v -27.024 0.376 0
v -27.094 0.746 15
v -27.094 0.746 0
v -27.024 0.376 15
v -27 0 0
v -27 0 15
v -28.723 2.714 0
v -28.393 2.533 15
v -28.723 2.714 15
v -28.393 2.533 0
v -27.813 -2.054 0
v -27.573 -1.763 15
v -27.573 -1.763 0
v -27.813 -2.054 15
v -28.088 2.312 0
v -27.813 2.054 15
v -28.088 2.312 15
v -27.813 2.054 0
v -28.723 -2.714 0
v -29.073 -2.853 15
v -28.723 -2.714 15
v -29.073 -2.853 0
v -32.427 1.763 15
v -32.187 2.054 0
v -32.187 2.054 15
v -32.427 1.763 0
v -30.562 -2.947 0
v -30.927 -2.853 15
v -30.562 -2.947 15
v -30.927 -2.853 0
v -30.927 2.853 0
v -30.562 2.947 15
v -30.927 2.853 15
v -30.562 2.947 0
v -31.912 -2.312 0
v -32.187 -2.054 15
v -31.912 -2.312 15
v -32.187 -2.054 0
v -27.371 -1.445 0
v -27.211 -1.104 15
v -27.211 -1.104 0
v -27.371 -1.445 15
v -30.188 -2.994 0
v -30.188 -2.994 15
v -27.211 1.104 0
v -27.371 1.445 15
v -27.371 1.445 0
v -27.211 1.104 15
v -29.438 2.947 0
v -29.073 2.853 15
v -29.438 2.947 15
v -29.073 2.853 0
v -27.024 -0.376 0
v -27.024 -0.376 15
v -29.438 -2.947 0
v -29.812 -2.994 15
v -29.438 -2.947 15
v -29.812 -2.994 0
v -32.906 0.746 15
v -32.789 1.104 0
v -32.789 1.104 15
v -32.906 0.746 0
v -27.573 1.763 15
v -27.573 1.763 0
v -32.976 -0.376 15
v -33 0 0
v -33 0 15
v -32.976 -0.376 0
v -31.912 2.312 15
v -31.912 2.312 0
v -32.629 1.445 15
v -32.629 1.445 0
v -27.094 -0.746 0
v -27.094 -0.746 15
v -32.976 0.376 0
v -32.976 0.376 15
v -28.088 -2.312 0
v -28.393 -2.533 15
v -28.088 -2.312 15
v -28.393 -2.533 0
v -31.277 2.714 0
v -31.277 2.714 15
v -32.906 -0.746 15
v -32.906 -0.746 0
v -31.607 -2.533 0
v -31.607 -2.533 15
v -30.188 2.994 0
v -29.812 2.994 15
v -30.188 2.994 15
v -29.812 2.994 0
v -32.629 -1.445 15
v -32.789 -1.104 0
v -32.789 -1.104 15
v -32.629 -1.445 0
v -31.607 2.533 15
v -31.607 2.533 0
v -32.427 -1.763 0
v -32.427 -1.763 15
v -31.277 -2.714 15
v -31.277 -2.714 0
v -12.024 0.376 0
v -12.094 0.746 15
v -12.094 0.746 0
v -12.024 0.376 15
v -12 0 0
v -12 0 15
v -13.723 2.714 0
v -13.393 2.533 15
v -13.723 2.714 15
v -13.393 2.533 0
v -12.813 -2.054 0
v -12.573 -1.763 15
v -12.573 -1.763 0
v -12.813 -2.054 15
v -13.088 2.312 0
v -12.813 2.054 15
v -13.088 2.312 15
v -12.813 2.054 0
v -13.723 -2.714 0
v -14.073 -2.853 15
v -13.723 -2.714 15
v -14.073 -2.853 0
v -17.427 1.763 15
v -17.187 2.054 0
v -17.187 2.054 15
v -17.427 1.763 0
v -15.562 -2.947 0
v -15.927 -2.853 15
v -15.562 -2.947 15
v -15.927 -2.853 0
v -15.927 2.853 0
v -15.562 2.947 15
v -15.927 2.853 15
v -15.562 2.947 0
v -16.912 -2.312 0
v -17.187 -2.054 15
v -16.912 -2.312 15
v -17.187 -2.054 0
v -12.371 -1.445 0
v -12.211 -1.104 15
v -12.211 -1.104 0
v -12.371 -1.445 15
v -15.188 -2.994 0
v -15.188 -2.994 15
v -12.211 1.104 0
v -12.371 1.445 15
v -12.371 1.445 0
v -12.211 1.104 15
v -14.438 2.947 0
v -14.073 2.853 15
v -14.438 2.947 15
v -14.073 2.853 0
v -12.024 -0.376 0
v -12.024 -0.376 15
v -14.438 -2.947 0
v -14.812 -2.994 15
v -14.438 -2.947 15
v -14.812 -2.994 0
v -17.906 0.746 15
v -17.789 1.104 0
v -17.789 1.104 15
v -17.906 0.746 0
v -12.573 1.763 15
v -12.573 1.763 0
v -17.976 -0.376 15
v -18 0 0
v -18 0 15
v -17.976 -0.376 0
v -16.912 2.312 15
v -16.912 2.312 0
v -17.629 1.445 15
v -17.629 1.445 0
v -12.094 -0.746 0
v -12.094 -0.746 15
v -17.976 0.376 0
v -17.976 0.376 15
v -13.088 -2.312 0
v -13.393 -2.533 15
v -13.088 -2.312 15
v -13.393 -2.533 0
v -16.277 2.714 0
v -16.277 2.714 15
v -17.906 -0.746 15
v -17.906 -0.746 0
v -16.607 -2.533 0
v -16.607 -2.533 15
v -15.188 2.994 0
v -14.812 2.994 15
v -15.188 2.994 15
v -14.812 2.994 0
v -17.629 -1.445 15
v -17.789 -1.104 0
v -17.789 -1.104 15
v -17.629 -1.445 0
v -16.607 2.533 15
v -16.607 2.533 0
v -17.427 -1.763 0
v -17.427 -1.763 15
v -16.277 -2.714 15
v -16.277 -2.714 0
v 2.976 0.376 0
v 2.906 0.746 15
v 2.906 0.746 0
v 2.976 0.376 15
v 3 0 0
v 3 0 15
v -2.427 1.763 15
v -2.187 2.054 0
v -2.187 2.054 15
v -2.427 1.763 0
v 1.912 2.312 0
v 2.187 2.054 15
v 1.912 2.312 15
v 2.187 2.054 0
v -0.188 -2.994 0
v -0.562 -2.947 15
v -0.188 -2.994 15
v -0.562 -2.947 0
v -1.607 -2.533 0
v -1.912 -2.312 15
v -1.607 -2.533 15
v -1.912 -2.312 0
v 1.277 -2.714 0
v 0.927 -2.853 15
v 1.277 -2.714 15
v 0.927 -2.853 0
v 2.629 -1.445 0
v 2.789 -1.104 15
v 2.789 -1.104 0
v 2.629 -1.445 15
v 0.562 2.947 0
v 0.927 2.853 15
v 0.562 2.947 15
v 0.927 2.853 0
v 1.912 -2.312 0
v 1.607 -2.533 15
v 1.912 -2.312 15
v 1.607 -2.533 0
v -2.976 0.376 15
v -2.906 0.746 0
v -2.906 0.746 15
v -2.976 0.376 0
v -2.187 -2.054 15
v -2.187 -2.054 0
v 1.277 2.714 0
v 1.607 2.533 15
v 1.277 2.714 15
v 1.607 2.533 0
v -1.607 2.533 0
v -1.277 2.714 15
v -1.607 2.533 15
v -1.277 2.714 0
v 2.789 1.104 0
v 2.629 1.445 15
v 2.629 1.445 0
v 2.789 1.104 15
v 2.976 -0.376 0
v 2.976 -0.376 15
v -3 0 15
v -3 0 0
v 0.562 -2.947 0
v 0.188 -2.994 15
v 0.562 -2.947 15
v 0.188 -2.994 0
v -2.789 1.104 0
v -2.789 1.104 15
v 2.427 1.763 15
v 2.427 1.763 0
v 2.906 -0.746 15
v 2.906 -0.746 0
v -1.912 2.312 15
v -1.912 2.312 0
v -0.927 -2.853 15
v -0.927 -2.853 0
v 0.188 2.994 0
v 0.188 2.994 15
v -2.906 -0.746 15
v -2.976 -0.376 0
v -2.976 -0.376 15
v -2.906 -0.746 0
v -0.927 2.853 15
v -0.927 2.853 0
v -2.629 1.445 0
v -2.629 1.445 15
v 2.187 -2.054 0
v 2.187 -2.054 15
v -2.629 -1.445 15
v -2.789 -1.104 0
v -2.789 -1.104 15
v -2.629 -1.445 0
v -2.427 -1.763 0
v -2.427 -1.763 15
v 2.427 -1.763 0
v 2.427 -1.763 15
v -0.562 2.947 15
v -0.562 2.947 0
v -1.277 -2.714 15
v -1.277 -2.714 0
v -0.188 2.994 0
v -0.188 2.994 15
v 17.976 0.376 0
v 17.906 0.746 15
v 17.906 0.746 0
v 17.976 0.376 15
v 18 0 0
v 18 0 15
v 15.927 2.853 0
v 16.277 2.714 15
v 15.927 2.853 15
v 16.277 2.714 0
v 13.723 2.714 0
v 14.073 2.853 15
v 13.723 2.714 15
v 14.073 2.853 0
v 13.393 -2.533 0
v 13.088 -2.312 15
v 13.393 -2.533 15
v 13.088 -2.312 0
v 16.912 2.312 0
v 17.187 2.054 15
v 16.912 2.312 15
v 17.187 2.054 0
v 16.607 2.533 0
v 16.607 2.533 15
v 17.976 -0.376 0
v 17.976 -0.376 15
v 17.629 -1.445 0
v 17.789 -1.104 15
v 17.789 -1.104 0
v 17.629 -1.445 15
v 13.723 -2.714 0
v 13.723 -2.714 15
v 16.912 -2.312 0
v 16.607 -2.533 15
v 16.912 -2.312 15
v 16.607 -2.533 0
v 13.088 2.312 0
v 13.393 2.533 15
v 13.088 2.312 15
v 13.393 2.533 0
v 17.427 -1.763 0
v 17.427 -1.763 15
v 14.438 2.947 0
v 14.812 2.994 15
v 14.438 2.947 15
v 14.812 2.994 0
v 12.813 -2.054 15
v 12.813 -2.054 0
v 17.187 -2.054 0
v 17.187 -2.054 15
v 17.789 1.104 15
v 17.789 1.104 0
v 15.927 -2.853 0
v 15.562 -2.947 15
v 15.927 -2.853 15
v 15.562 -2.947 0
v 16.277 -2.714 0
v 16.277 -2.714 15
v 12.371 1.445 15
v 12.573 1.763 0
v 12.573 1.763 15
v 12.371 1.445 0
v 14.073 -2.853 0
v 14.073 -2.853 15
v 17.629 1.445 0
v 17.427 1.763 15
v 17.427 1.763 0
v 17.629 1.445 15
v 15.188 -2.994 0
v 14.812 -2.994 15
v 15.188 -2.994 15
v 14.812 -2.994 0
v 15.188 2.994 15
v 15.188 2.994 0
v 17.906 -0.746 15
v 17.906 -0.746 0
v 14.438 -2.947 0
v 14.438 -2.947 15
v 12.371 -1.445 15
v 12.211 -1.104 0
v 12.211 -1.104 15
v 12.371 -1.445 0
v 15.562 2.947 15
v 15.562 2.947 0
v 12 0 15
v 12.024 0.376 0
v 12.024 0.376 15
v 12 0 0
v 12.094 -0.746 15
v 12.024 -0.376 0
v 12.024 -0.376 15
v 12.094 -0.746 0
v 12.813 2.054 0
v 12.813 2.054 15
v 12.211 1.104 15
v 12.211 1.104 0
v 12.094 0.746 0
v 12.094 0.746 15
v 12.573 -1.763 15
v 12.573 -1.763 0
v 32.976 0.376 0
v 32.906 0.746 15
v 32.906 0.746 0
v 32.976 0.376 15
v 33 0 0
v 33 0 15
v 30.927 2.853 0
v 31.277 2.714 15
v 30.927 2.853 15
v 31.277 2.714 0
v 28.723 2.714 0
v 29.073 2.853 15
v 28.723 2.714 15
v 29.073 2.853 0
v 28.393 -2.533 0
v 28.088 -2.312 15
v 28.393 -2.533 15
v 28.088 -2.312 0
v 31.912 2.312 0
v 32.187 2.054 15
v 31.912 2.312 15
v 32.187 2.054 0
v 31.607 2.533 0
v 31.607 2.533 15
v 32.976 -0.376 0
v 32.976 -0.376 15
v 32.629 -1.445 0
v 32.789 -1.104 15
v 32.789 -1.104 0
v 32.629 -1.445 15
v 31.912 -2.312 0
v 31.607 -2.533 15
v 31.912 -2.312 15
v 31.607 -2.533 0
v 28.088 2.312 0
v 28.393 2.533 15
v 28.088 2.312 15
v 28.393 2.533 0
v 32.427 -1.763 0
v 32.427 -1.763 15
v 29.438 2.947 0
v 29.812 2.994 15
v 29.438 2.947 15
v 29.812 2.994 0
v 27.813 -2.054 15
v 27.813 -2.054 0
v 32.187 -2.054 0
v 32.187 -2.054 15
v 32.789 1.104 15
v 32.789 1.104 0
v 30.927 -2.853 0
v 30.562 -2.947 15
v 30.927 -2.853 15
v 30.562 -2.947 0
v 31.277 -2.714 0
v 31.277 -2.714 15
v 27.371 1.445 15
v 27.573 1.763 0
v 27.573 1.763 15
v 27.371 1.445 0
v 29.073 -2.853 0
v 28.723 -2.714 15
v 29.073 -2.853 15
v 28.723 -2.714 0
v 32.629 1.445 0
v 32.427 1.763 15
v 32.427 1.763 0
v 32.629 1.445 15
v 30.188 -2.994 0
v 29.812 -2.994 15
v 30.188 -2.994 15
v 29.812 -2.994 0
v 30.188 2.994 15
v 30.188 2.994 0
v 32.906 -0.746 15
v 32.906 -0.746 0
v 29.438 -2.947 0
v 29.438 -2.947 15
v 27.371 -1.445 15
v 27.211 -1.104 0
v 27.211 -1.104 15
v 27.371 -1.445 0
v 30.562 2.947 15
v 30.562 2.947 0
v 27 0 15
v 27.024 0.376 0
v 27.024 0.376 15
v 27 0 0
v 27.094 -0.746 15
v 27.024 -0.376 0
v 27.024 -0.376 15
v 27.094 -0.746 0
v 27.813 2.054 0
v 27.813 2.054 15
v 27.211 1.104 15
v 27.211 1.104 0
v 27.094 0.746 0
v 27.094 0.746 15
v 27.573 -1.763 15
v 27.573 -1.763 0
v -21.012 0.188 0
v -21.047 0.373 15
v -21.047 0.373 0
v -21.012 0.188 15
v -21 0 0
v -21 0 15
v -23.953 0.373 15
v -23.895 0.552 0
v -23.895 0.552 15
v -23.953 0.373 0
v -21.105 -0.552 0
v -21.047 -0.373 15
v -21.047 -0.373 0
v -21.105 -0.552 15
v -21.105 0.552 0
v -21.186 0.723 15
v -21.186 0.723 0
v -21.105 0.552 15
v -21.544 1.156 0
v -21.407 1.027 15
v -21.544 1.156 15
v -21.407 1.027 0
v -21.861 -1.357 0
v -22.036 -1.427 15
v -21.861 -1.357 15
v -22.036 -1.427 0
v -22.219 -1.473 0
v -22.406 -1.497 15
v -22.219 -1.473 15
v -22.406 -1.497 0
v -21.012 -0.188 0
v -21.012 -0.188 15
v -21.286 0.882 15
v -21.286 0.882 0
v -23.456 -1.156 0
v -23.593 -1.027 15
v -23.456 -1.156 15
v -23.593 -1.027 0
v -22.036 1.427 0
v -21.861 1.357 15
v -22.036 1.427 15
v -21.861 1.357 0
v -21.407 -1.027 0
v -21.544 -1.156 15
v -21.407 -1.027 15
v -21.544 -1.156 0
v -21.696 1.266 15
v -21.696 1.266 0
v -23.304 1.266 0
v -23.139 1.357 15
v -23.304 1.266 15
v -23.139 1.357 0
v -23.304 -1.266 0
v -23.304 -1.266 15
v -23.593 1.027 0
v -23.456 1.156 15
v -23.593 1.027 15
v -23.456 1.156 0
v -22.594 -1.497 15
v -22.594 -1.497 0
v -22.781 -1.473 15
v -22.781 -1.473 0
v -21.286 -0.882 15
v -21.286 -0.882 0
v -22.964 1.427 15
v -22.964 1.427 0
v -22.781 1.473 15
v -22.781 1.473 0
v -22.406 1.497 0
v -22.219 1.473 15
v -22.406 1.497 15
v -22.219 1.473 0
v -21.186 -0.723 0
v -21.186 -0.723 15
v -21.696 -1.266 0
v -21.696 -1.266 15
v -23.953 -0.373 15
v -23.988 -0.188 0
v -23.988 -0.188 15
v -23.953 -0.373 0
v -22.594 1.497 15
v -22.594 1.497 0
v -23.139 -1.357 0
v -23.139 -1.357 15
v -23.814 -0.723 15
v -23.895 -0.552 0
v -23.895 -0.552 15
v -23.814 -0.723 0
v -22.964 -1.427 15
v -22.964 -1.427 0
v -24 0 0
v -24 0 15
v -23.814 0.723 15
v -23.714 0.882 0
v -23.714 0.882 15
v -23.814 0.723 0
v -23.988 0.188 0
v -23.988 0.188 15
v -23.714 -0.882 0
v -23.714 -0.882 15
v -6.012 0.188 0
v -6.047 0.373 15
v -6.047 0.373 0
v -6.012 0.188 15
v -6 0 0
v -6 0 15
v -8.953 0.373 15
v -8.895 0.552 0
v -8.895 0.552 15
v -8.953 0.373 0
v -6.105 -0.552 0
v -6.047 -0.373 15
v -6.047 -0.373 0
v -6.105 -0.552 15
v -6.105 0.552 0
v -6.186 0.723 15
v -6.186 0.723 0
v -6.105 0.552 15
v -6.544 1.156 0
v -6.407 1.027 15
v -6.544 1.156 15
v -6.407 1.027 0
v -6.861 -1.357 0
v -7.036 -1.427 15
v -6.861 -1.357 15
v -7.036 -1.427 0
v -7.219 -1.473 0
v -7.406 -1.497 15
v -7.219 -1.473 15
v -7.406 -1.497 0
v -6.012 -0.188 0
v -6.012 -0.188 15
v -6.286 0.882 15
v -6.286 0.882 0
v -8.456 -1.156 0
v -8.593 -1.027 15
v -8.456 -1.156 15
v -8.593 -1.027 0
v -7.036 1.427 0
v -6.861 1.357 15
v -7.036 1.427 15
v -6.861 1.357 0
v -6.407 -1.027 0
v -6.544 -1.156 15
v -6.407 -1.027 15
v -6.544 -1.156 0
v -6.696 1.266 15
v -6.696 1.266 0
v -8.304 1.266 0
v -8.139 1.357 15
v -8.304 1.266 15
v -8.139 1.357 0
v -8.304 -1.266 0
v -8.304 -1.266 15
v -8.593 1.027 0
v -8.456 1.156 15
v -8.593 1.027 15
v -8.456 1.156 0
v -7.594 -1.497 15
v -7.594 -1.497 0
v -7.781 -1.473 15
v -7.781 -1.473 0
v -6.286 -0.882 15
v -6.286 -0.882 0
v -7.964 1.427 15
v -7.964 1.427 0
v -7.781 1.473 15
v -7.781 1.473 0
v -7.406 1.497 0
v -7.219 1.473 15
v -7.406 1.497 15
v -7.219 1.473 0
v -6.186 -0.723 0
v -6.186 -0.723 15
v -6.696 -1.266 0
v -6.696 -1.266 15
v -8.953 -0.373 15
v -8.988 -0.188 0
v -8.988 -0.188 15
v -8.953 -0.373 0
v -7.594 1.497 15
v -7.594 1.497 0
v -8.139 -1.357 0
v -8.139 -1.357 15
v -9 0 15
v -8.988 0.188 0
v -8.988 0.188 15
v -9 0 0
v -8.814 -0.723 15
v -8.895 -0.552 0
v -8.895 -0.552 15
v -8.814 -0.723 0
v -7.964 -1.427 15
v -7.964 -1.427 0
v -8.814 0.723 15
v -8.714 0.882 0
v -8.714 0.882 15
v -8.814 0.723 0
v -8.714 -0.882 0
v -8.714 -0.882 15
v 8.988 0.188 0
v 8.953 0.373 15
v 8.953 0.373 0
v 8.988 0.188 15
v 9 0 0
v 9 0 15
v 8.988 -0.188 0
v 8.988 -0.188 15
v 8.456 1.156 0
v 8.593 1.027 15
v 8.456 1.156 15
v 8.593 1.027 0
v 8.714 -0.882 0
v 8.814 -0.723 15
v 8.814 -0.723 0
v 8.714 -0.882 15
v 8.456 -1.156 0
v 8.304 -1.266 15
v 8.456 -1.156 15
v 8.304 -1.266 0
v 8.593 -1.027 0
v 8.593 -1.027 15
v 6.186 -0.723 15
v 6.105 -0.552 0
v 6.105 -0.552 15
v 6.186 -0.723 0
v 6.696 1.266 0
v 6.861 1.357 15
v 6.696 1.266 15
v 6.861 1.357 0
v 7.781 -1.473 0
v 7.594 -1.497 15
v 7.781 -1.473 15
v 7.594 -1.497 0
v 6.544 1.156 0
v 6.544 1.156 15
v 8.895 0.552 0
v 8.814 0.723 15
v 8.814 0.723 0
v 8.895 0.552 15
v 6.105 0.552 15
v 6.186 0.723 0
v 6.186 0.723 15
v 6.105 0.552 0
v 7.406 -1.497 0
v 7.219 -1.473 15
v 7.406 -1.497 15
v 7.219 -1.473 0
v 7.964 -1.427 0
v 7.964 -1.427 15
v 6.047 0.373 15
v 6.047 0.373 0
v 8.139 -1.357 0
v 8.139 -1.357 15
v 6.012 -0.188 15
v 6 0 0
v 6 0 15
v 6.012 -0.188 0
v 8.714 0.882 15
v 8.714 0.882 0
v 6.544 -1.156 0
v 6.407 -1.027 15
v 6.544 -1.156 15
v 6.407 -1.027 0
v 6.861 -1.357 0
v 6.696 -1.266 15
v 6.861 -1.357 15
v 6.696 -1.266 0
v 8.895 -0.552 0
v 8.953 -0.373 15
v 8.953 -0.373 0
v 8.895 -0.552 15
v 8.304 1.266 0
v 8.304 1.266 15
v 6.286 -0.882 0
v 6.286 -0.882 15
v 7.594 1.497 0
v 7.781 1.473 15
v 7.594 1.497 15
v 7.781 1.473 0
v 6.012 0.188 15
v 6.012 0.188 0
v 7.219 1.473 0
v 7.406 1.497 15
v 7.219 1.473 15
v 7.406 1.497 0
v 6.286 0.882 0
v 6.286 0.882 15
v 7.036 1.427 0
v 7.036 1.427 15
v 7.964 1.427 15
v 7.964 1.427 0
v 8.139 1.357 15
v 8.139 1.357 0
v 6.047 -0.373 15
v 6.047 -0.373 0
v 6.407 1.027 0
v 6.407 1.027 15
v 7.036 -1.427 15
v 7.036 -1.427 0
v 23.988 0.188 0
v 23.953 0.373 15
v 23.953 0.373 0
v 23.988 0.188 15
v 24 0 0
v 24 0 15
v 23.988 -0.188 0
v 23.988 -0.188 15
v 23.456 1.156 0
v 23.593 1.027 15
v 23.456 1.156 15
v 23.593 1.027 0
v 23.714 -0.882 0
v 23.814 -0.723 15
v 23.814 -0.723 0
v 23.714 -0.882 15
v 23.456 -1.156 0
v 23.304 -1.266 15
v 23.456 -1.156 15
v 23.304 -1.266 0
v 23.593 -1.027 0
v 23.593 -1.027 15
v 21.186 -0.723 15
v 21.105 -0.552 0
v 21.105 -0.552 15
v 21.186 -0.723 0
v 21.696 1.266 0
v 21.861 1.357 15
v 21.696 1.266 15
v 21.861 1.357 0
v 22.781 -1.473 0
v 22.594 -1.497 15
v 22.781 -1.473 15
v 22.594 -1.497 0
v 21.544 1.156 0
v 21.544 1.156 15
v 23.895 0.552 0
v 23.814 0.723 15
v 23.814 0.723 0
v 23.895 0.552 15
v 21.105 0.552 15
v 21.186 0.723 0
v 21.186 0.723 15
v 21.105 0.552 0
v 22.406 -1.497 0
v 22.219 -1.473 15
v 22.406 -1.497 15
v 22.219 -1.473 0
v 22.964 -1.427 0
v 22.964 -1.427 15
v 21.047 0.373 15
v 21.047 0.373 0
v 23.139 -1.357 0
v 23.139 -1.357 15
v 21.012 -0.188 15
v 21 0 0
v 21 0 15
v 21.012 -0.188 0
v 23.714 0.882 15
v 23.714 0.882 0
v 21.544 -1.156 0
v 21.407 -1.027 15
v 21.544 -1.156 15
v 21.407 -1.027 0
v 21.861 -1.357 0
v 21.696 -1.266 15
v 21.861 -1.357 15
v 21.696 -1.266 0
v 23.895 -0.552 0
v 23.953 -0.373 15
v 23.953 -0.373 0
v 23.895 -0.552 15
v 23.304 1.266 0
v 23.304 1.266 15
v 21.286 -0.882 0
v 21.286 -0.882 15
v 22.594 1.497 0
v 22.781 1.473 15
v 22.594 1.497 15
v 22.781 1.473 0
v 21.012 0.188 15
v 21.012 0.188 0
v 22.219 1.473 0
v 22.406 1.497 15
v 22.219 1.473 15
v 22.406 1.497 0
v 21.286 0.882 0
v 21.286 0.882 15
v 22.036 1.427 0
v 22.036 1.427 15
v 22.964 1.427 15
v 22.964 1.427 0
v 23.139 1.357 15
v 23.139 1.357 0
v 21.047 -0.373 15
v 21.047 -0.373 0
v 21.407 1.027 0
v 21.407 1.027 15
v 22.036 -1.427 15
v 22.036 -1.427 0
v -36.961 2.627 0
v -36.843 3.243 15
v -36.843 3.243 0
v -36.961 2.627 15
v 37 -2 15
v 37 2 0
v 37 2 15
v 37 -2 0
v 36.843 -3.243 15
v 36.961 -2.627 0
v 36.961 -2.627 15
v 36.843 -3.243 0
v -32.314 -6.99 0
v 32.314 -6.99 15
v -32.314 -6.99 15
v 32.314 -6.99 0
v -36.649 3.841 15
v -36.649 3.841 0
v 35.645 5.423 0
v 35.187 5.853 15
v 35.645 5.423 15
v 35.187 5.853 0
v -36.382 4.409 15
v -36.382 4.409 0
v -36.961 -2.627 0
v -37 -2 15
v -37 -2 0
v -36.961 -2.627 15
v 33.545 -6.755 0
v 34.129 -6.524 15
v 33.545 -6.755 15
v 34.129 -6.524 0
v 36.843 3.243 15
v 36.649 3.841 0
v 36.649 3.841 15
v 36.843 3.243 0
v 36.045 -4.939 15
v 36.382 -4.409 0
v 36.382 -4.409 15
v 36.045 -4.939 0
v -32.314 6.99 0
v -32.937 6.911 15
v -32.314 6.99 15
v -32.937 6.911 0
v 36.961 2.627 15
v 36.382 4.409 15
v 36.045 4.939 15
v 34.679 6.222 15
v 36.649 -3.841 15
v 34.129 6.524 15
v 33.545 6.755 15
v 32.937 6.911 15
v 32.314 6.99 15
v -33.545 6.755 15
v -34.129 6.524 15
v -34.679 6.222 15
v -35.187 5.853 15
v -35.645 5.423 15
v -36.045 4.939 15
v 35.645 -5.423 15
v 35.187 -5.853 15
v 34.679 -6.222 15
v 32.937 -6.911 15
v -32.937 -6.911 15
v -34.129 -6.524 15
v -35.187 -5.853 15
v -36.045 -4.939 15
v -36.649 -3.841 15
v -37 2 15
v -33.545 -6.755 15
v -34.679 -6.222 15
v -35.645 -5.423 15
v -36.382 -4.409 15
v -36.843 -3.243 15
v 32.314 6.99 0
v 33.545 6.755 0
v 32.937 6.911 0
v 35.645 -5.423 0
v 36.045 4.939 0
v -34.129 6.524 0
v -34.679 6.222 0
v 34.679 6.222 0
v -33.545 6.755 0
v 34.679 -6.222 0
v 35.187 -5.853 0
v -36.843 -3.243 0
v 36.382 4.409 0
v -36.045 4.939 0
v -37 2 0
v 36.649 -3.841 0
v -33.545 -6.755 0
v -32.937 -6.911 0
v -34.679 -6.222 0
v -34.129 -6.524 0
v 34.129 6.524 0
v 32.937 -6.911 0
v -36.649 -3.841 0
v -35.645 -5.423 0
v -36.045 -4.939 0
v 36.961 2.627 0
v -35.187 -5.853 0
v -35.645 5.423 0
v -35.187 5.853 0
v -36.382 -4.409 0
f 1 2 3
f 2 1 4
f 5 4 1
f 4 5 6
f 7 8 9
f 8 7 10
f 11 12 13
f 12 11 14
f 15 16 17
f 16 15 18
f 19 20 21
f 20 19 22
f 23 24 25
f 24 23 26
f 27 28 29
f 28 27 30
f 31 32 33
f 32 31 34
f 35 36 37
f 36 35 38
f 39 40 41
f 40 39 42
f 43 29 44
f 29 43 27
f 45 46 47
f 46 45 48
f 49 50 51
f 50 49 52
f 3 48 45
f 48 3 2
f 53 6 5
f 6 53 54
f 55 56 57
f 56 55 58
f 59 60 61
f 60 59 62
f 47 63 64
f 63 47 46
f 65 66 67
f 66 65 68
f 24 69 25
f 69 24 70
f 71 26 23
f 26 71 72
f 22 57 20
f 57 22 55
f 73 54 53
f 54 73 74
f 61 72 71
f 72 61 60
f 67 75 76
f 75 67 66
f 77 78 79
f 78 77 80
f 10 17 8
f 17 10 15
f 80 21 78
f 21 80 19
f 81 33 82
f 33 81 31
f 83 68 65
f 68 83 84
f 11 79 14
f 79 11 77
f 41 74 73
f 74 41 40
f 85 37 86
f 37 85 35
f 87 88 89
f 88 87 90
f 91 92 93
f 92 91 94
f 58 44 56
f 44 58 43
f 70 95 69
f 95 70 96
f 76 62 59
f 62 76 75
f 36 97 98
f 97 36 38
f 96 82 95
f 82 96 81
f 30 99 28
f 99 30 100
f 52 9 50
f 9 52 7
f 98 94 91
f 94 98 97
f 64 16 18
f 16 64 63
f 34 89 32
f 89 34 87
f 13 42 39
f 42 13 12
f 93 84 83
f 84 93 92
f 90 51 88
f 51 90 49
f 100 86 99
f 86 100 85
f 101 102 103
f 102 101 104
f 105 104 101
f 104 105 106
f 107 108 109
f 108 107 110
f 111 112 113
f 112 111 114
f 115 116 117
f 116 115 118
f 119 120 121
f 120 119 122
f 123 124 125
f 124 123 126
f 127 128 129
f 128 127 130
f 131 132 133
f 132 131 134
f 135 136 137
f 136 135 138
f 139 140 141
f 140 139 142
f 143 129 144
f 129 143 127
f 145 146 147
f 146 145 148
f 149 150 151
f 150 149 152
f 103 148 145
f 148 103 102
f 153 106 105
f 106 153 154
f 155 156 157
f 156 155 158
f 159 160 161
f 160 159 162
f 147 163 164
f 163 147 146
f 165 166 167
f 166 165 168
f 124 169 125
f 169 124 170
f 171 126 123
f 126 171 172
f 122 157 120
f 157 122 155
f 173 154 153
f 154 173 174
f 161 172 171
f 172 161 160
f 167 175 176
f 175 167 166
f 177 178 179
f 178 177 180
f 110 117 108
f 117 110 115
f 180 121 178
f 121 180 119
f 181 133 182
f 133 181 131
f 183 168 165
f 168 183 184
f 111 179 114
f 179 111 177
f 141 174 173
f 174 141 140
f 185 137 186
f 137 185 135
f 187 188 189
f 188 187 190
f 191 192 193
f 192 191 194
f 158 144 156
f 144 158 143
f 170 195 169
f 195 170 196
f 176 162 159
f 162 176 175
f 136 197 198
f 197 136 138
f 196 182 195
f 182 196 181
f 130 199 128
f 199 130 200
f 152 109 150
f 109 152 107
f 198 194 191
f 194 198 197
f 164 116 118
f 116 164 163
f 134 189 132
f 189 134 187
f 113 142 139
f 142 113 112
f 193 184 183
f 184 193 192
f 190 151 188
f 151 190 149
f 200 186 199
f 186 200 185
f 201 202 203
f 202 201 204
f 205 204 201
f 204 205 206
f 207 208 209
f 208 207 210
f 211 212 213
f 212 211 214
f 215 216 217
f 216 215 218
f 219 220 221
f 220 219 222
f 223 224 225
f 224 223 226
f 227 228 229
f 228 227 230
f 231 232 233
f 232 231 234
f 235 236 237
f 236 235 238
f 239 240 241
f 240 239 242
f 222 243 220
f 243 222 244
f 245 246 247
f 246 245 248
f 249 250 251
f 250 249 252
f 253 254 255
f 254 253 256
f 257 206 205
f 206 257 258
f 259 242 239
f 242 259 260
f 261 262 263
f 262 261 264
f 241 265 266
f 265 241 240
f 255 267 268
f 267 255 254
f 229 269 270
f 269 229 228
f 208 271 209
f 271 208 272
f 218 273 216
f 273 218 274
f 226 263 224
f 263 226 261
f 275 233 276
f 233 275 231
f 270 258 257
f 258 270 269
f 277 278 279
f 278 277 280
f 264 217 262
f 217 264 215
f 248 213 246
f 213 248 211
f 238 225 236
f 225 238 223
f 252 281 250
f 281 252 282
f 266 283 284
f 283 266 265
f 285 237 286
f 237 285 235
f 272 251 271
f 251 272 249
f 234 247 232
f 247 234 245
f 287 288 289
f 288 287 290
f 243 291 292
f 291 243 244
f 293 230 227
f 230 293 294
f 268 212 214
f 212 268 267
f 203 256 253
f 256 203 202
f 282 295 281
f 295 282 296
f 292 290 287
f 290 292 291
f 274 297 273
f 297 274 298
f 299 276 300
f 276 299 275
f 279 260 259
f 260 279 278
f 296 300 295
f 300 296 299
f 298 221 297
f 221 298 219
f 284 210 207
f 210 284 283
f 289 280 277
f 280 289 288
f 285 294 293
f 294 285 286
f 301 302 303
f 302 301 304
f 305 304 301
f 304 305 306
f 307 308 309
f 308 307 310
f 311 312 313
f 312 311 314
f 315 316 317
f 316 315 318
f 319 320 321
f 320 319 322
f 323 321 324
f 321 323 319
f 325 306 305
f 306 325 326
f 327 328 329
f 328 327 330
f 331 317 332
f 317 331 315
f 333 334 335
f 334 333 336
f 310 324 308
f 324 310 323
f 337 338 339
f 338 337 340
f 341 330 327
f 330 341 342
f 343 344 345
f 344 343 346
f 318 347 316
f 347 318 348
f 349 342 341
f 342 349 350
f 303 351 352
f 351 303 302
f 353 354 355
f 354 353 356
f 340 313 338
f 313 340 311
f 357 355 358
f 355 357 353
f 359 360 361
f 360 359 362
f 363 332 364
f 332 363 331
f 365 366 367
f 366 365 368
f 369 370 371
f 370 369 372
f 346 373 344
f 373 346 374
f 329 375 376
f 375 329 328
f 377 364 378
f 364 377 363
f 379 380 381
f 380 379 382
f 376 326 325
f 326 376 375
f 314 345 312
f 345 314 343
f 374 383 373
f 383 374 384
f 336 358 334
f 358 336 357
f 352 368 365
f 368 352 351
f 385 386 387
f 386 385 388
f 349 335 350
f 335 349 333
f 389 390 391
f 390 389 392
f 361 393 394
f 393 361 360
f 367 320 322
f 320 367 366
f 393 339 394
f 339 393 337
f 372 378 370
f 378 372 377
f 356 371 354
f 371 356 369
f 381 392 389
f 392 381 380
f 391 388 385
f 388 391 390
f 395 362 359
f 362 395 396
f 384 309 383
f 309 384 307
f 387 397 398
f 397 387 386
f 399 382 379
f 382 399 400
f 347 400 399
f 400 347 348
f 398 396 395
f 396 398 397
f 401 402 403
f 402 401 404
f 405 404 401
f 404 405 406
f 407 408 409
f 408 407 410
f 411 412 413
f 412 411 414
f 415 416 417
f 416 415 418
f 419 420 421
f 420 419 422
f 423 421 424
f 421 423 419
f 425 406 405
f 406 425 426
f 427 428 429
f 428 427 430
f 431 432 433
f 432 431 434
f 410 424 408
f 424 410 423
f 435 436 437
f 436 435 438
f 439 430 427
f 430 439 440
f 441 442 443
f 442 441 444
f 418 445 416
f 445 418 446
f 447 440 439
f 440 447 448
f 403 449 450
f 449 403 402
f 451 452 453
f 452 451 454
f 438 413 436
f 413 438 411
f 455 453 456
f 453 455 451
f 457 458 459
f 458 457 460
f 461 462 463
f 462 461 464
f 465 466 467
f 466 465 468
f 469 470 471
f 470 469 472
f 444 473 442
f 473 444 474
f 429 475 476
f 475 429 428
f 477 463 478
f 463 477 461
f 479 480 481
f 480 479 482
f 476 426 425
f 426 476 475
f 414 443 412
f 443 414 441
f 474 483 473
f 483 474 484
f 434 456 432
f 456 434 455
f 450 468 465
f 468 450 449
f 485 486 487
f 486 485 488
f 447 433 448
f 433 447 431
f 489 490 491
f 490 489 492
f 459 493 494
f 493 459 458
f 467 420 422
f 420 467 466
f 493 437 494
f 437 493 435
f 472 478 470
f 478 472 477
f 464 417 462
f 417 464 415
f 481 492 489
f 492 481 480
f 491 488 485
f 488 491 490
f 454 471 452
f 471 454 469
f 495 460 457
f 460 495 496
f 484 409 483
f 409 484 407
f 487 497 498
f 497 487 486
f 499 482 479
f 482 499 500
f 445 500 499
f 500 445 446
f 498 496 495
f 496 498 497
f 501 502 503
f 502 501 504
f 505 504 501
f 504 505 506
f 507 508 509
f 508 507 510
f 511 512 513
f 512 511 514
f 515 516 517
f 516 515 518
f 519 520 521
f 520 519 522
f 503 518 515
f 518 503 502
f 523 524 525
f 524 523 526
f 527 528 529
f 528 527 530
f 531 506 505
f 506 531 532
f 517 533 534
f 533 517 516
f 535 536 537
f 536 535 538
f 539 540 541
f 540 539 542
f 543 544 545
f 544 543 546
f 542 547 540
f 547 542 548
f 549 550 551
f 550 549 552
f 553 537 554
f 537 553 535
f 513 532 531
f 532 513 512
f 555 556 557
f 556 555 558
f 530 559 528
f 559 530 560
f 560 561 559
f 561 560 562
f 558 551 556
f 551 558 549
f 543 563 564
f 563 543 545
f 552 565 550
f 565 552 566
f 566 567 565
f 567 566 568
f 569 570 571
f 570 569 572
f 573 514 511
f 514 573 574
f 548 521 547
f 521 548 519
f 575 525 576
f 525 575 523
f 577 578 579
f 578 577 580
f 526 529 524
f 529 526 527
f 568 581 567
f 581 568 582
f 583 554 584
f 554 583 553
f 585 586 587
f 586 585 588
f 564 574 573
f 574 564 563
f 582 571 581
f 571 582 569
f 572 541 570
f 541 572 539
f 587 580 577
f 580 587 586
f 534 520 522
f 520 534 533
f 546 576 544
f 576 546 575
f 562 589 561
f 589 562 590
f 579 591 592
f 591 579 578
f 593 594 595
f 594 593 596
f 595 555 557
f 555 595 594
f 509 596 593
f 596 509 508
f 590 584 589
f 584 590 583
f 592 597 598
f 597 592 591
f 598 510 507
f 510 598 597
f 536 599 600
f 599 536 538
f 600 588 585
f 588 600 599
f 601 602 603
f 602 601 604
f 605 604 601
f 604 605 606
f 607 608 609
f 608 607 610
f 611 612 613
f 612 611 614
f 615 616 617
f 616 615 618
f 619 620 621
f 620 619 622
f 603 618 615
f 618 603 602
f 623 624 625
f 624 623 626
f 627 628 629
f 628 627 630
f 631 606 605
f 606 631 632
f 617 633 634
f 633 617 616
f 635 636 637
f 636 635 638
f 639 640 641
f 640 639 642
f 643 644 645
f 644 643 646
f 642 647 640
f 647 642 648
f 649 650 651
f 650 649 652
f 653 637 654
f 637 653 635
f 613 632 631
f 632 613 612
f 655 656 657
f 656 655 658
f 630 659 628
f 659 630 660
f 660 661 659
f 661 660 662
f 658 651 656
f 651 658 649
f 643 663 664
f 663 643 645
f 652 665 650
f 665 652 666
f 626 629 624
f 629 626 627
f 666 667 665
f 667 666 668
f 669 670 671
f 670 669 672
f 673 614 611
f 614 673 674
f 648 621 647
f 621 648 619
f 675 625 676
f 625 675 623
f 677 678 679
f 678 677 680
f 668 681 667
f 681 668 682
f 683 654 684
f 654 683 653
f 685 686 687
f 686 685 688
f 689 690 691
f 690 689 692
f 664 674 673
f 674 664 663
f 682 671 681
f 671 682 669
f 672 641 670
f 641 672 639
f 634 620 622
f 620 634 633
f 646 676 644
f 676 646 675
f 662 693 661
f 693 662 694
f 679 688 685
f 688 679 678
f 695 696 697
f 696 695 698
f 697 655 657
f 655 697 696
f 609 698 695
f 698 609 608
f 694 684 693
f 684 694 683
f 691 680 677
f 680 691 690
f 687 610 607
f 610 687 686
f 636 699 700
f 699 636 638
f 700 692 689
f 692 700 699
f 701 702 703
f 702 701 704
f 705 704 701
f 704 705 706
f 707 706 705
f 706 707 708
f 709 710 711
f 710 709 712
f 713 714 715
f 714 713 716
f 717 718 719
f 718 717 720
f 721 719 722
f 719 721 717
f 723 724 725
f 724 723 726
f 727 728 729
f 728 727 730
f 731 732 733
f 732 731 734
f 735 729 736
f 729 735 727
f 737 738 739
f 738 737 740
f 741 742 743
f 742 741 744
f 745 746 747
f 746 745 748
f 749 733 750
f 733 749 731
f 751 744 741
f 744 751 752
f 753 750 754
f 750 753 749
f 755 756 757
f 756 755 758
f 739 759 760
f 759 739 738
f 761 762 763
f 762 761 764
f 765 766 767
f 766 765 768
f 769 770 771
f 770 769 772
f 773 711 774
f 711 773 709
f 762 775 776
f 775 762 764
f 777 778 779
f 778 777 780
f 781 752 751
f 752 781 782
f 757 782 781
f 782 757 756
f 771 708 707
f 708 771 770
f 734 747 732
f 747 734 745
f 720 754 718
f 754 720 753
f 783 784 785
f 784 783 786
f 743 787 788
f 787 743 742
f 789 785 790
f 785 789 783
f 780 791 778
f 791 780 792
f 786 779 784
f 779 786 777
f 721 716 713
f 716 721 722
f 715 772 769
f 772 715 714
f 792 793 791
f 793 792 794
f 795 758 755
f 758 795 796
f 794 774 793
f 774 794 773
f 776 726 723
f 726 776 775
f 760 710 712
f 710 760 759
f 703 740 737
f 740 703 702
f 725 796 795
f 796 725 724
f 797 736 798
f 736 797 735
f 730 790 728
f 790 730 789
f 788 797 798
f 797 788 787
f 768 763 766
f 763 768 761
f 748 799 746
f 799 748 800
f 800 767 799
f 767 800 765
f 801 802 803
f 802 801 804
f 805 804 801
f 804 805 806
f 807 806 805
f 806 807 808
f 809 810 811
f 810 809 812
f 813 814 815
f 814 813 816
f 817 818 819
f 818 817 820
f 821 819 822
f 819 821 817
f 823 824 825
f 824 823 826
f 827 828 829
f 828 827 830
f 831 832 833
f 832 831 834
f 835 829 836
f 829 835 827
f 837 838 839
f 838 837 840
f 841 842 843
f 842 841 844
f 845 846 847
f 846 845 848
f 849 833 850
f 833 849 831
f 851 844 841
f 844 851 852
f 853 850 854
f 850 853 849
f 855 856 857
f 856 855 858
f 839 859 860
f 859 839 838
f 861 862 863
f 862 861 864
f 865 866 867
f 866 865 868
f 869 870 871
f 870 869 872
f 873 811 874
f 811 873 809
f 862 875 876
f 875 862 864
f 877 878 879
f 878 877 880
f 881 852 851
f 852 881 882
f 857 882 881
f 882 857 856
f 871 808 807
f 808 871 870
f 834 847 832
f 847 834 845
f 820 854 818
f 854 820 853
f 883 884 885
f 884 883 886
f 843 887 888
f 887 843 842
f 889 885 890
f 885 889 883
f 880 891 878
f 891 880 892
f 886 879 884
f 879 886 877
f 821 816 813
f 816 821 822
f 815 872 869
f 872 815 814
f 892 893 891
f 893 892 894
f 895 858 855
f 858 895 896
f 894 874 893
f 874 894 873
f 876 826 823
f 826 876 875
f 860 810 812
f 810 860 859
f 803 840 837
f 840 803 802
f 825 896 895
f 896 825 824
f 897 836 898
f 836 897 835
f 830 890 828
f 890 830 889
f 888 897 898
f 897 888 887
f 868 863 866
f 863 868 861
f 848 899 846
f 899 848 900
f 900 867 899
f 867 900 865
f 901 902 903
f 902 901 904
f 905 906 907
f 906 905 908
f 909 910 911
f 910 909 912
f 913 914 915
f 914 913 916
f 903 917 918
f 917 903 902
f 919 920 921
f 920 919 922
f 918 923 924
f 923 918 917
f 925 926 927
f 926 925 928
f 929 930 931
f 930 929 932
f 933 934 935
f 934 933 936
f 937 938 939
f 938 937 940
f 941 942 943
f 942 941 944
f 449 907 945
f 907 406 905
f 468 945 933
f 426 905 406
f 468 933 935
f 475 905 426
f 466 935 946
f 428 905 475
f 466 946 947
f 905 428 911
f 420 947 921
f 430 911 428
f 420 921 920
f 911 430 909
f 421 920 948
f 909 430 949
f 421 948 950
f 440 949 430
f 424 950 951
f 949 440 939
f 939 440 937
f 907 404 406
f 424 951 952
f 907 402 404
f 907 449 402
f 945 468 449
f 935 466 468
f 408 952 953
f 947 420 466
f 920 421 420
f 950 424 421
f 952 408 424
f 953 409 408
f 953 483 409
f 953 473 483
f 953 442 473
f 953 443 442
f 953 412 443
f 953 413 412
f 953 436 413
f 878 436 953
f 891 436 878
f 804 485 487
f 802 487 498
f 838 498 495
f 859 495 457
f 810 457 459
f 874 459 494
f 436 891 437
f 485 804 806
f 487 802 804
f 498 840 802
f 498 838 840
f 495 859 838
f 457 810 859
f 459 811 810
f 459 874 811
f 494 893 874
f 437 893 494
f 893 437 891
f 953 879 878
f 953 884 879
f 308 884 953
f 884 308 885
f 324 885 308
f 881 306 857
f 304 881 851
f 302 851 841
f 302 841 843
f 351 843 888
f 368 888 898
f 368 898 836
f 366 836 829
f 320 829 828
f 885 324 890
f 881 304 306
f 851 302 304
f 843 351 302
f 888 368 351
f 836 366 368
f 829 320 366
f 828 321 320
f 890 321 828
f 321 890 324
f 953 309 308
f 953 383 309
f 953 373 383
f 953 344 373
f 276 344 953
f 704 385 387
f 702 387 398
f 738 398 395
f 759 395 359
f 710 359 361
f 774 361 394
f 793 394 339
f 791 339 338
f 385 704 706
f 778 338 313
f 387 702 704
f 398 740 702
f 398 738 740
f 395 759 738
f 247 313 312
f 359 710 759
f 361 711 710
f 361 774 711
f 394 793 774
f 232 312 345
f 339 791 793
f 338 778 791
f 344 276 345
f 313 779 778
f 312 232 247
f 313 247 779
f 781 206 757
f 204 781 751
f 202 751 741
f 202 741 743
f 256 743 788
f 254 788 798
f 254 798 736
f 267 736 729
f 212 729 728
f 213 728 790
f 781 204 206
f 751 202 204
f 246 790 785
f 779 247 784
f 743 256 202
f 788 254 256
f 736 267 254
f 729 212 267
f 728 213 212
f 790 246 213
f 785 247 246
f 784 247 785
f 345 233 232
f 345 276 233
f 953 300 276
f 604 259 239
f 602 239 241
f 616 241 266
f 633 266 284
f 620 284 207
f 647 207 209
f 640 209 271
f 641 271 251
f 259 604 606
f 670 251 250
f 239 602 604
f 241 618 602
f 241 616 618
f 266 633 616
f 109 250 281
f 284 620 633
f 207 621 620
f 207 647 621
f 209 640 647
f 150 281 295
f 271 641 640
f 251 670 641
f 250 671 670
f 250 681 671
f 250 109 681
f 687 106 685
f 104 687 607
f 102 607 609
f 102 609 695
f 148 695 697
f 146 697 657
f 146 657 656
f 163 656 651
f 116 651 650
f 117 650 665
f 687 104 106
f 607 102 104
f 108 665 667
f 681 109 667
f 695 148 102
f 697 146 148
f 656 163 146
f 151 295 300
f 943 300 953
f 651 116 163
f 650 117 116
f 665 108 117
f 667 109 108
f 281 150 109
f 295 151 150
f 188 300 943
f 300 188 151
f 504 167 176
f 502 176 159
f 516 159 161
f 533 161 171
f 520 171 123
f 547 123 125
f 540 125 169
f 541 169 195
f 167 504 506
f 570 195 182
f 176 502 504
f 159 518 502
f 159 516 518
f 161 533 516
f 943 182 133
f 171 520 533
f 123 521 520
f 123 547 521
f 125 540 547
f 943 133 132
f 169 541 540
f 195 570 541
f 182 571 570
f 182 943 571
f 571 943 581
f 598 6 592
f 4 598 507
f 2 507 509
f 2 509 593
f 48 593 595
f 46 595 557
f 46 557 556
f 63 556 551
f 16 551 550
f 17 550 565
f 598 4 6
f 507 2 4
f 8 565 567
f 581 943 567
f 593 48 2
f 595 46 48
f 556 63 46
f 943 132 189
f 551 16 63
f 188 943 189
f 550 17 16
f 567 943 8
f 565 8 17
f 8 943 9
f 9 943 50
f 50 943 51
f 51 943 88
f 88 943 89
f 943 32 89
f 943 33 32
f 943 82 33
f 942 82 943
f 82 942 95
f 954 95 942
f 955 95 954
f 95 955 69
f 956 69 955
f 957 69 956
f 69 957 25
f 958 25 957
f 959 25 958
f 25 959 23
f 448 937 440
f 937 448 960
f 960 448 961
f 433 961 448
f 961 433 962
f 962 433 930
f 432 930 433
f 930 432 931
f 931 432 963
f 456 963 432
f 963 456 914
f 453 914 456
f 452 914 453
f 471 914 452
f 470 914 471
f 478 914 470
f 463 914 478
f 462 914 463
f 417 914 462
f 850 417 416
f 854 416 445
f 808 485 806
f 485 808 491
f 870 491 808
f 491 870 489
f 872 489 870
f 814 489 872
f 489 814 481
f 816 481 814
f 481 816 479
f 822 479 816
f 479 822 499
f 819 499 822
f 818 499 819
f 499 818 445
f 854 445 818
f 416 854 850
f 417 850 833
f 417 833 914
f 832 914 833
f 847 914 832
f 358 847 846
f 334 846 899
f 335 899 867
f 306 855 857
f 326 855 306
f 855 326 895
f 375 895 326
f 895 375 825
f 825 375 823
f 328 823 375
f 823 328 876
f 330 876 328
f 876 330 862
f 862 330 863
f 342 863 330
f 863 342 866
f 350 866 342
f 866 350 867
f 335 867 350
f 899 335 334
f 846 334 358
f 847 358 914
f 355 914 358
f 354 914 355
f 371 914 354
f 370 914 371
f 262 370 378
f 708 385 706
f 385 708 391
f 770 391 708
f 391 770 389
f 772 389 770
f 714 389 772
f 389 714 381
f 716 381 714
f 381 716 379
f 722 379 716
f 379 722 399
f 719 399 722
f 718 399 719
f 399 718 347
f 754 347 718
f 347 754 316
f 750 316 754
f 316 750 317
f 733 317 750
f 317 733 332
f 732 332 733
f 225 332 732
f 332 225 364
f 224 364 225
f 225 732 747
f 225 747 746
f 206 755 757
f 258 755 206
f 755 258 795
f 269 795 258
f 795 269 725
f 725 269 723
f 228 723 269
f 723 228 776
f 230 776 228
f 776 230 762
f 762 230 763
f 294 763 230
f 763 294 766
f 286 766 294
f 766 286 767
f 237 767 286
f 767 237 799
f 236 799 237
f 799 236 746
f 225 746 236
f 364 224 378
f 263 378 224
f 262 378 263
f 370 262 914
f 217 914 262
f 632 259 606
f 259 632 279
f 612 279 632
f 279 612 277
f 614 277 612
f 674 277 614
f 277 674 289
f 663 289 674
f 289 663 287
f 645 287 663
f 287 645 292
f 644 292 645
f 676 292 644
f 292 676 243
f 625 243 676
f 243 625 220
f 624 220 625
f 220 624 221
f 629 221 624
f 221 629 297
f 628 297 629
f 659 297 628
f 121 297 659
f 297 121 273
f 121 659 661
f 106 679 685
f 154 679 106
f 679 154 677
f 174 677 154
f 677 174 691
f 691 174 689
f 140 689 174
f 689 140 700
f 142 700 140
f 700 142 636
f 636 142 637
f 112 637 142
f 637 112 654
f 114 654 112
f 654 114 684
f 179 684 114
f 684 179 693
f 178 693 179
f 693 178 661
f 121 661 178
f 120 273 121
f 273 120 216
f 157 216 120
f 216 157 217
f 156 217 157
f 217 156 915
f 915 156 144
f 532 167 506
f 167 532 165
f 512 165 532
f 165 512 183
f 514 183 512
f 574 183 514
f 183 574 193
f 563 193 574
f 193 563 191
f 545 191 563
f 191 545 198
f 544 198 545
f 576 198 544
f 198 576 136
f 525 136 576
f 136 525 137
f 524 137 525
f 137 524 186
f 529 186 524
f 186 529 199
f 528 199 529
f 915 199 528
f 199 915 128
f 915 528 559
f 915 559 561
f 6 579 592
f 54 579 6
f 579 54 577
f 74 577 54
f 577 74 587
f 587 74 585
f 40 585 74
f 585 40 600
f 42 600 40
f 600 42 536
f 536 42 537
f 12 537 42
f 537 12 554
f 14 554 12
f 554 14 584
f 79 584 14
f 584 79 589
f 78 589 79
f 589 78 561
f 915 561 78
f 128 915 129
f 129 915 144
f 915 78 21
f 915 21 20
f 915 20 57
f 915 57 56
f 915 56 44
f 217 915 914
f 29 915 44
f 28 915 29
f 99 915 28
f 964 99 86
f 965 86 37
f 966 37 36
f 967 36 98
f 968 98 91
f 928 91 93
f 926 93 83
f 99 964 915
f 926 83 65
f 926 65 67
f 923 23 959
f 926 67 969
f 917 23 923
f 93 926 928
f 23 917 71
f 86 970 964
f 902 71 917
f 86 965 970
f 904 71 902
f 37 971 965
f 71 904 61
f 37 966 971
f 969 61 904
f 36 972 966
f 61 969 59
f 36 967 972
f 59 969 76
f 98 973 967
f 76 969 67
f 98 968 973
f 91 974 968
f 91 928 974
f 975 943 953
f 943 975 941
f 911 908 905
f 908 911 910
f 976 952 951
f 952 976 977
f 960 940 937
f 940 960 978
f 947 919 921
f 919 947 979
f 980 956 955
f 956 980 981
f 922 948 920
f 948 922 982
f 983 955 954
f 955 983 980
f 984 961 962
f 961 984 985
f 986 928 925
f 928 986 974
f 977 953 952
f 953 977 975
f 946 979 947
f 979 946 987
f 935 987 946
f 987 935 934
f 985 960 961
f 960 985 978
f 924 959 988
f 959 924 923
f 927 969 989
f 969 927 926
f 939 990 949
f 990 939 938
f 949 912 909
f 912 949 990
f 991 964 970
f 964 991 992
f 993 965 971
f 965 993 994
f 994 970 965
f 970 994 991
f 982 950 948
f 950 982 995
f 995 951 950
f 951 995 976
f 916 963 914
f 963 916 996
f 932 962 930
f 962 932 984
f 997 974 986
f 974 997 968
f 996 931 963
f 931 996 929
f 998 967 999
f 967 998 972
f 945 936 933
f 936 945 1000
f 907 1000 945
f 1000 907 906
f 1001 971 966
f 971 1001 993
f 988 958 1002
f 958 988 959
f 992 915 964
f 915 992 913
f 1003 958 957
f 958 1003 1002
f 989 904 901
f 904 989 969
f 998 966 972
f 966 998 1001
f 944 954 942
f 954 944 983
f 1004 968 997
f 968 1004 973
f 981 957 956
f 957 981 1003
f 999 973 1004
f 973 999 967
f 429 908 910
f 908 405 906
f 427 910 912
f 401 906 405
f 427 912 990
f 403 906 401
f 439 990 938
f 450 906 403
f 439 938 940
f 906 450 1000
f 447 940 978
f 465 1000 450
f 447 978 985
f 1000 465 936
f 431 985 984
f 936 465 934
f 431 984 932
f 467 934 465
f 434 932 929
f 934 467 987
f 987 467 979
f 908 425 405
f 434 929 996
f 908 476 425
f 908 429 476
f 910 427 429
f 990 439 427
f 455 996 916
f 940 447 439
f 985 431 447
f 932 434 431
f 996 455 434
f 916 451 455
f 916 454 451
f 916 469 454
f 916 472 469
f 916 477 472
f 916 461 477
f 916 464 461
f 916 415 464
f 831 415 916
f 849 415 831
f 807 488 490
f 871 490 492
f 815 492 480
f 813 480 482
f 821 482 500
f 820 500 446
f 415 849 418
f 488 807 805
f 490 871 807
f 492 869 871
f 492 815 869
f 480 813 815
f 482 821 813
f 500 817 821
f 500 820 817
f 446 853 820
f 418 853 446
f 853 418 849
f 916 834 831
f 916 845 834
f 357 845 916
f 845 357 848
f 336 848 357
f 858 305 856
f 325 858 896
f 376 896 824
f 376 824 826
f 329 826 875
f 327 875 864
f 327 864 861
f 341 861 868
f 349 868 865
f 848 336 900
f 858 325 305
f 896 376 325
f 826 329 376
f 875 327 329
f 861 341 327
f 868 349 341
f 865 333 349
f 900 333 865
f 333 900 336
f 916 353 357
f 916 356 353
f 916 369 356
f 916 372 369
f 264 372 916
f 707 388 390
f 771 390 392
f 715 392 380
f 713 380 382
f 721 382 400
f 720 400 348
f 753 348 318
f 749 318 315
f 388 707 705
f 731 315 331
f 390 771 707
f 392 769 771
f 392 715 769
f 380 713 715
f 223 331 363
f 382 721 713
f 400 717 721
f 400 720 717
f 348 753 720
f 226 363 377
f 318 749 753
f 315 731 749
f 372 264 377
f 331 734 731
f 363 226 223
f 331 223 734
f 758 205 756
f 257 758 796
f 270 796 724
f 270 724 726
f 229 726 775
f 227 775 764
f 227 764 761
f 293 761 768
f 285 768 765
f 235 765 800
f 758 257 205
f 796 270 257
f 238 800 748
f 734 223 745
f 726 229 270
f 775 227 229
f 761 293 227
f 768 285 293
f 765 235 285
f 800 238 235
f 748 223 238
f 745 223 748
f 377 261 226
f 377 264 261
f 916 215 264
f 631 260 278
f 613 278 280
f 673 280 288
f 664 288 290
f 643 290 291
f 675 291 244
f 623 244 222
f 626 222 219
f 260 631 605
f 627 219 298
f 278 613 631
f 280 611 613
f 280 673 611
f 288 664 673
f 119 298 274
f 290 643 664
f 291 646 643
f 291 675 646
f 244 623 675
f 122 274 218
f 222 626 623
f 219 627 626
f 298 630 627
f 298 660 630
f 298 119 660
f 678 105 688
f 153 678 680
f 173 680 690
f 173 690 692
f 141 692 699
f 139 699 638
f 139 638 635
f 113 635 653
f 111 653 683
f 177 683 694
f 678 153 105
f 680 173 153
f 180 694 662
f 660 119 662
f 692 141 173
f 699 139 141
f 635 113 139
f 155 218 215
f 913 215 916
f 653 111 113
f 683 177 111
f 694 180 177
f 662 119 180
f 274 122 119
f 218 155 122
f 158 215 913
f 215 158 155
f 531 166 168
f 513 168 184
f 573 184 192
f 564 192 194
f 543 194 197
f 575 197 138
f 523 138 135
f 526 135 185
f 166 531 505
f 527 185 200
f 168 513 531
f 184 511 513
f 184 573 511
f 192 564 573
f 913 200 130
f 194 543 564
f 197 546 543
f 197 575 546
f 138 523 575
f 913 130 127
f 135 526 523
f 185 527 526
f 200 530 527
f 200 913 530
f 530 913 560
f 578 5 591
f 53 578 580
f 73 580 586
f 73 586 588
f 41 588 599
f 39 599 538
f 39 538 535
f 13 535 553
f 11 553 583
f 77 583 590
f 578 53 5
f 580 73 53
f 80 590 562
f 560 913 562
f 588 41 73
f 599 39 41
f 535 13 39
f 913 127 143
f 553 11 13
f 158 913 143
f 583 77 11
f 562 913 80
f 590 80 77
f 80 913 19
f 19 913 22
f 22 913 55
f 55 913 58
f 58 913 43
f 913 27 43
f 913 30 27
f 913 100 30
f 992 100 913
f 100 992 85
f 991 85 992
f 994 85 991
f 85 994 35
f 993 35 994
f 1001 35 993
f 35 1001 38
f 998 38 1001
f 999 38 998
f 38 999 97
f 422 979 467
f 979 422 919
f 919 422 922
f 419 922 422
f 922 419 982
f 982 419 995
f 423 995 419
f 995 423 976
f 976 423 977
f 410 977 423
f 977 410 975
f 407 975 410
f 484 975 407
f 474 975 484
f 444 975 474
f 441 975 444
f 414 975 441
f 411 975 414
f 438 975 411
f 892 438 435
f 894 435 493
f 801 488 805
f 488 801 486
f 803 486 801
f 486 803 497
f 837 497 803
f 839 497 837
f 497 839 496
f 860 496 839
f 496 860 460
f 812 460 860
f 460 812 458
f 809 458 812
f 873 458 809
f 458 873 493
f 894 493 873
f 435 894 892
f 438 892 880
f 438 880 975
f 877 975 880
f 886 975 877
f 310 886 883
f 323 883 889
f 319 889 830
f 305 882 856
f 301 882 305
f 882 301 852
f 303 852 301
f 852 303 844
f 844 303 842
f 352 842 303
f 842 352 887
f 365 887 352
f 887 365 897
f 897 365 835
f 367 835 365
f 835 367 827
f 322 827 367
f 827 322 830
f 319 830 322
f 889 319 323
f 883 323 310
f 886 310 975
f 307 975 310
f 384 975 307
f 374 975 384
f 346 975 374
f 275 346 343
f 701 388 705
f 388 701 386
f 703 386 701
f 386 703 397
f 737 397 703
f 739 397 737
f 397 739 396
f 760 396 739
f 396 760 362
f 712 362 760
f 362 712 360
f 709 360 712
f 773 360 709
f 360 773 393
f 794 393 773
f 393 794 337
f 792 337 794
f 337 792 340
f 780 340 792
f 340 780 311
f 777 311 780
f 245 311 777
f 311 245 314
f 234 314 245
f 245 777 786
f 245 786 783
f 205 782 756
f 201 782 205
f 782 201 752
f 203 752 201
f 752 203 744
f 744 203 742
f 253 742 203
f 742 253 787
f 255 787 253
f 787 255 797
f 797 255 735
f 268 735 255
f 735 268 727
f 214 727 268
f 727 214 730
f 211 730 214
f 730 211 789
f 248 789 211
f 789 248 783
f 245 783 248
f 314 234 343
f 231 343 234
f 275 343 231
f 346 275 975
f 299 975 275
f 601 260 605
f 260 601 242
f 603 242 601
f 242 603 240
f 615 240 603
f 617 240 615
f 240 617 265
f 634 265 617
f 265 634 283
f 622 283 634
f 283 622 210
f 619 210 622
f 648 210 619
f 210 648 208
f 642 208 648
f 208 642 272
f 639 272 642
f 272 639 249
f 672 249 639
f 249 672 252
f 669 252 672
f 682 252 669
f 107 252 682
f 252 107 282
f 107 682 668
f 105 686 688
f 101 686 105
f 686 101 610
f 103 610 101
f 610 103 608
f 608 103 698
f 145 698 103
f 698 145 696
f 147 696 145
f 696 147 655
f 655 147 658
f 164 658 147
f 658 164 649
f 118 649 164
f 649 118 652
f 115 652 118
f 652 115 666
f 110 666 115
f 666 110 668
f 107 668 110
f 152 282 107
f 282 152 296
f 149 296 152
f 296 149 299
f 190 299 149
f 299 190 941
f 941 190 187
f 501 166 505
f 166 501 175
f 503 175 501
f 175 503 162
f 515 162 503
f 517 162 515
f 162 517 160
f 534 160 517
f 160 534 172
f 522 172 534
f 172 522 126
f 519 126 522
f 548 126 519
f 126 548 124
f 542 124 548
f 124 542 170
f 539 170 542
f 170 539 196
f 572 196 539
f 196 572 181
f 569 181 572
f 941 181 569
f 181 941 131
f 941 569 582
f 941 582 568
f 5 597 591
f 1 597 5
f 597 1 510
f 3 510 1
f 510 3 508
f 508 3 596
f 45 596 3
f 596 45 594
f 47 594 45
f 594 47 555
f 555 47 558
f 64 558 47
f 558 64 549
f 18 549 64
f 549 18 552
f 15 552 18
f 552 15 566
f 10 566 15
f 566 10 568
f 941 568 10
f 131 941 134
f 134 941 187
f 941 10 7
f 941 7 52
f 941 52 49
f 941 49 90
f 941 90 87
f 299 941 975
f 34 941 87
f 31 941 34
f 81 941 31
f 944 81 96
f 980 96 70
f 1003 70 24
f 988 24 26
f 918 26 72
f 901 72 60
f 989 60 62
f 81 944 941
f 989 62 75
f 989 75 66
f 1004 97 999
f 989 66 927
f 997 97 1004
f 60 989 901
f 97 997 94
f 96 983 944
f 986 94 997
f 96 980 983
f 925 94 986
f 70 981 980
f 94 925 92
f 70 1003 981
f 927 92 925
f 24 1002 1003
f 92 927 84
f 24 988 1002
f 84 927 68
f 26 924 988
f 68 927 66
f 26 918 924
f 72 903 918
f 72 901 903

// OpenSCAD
$fn = 50;


difference() {
	union() {
		hull() {
			translate(v = [-32.0000000000, 2.0000000000, 0]) {
				cylinder(h = 15, r = 5);
			}
			translate(v = [32.0000000000, 2.0000000000, 0]) {
				cylinder(h = 15, r = 5);
			}
			translate(v = [-32.0000000000, -2.0000000000, 0]) {
				cylinder(h = 15, r = 5);
			}
			translate(v = [32.0000000000, -2.0000000000, 0]) {
				cylinder(h = 15, r = 5);
			}
		}
	}
	union() {
		translate(v = [-30.0000000000, 0.0000000000, 0]) {
			translate(v = [0, 0, -100]) {
				cylinder(h = 200, r = 3.0000000000);
			}
		}
		translate(v = [-15.0000000000, 0.0000000000, 0]) {
			translate(v = [0, 0, -100]) {
				cylinder(h = 200, r = 3.0000000000);
			}
		}
		translate(v = [0, 0, -100]) {
			cylinder(h = 200, r = 3.0000000000);
		}
		translate(v = [15.0000000000, 0.0000000000, 0]) {
			translate(v = [0, 0, -100]) {
				cylinder(h = 200, r = 3.0000000000);
			}
		}
		translate(v = [30.0000000000, 0.0000000000, 0]) {
			translate(v = [0, 0, -100]) {
				cylinder(h = 200, r = 3.0000000000);
			}
		}
		translate(v = [-30.0000000000, 0.0000000000, 0]) {
			translate(v = [0, 0, -100]) {
				cylinder(h = 200, r = 1.5000000000);
			}
		}
		translate(v = [-22.5000000000, 0.0000000000, 0]) {
			translate(v = [0, 0, -100]) {
				cylinder(h = 200, r = 1.5000000000);
			}
		}
		translate(v = [-15.0000000000, 0.0000000000, 0]) {
			translate(v = [0, 0, -100]) {
				cylinder(h = 200, r = 1.5000000000);
			}
		}
		translate(v = [-7.5000000000, 0.0000000000, 0]) {
			translate(v = [0, 0, -100]) {
				cylinder(h = 200, r = 1.5000000000);
			}
		}
		translate(v = [0, 0, -100]) {
			cylinder(h = 200, r = 1.5000000000);
		}
		translate(v = [7.5000000000, 0.0000000000, 0]) {
			translate(v = [0, 0, -100]) {
				cylinder(h = 200, r = 1.5000000000);
			}
		}
		translate(v = [15.0000000000, 0.0000000000, 0]) {
			translate(v = [0, 0, -100]) {
				cylinder(h = 200, r = 1.5000000000);
			}
		}
		translate(v = [22.5000000000, 0.0000000000, 0]) {
			translate(v = [0, 0, -100]) {
				cylinder(h = 200, r = 1.5000000000);
			}
		}
		translate(v = [30.0000000000, 0.0000000000, 0]) {
			translate(v = [0, 0, -100]) {
				cylinder(h = 200, r = 1.5000000000);
			}
		}
	}
}
